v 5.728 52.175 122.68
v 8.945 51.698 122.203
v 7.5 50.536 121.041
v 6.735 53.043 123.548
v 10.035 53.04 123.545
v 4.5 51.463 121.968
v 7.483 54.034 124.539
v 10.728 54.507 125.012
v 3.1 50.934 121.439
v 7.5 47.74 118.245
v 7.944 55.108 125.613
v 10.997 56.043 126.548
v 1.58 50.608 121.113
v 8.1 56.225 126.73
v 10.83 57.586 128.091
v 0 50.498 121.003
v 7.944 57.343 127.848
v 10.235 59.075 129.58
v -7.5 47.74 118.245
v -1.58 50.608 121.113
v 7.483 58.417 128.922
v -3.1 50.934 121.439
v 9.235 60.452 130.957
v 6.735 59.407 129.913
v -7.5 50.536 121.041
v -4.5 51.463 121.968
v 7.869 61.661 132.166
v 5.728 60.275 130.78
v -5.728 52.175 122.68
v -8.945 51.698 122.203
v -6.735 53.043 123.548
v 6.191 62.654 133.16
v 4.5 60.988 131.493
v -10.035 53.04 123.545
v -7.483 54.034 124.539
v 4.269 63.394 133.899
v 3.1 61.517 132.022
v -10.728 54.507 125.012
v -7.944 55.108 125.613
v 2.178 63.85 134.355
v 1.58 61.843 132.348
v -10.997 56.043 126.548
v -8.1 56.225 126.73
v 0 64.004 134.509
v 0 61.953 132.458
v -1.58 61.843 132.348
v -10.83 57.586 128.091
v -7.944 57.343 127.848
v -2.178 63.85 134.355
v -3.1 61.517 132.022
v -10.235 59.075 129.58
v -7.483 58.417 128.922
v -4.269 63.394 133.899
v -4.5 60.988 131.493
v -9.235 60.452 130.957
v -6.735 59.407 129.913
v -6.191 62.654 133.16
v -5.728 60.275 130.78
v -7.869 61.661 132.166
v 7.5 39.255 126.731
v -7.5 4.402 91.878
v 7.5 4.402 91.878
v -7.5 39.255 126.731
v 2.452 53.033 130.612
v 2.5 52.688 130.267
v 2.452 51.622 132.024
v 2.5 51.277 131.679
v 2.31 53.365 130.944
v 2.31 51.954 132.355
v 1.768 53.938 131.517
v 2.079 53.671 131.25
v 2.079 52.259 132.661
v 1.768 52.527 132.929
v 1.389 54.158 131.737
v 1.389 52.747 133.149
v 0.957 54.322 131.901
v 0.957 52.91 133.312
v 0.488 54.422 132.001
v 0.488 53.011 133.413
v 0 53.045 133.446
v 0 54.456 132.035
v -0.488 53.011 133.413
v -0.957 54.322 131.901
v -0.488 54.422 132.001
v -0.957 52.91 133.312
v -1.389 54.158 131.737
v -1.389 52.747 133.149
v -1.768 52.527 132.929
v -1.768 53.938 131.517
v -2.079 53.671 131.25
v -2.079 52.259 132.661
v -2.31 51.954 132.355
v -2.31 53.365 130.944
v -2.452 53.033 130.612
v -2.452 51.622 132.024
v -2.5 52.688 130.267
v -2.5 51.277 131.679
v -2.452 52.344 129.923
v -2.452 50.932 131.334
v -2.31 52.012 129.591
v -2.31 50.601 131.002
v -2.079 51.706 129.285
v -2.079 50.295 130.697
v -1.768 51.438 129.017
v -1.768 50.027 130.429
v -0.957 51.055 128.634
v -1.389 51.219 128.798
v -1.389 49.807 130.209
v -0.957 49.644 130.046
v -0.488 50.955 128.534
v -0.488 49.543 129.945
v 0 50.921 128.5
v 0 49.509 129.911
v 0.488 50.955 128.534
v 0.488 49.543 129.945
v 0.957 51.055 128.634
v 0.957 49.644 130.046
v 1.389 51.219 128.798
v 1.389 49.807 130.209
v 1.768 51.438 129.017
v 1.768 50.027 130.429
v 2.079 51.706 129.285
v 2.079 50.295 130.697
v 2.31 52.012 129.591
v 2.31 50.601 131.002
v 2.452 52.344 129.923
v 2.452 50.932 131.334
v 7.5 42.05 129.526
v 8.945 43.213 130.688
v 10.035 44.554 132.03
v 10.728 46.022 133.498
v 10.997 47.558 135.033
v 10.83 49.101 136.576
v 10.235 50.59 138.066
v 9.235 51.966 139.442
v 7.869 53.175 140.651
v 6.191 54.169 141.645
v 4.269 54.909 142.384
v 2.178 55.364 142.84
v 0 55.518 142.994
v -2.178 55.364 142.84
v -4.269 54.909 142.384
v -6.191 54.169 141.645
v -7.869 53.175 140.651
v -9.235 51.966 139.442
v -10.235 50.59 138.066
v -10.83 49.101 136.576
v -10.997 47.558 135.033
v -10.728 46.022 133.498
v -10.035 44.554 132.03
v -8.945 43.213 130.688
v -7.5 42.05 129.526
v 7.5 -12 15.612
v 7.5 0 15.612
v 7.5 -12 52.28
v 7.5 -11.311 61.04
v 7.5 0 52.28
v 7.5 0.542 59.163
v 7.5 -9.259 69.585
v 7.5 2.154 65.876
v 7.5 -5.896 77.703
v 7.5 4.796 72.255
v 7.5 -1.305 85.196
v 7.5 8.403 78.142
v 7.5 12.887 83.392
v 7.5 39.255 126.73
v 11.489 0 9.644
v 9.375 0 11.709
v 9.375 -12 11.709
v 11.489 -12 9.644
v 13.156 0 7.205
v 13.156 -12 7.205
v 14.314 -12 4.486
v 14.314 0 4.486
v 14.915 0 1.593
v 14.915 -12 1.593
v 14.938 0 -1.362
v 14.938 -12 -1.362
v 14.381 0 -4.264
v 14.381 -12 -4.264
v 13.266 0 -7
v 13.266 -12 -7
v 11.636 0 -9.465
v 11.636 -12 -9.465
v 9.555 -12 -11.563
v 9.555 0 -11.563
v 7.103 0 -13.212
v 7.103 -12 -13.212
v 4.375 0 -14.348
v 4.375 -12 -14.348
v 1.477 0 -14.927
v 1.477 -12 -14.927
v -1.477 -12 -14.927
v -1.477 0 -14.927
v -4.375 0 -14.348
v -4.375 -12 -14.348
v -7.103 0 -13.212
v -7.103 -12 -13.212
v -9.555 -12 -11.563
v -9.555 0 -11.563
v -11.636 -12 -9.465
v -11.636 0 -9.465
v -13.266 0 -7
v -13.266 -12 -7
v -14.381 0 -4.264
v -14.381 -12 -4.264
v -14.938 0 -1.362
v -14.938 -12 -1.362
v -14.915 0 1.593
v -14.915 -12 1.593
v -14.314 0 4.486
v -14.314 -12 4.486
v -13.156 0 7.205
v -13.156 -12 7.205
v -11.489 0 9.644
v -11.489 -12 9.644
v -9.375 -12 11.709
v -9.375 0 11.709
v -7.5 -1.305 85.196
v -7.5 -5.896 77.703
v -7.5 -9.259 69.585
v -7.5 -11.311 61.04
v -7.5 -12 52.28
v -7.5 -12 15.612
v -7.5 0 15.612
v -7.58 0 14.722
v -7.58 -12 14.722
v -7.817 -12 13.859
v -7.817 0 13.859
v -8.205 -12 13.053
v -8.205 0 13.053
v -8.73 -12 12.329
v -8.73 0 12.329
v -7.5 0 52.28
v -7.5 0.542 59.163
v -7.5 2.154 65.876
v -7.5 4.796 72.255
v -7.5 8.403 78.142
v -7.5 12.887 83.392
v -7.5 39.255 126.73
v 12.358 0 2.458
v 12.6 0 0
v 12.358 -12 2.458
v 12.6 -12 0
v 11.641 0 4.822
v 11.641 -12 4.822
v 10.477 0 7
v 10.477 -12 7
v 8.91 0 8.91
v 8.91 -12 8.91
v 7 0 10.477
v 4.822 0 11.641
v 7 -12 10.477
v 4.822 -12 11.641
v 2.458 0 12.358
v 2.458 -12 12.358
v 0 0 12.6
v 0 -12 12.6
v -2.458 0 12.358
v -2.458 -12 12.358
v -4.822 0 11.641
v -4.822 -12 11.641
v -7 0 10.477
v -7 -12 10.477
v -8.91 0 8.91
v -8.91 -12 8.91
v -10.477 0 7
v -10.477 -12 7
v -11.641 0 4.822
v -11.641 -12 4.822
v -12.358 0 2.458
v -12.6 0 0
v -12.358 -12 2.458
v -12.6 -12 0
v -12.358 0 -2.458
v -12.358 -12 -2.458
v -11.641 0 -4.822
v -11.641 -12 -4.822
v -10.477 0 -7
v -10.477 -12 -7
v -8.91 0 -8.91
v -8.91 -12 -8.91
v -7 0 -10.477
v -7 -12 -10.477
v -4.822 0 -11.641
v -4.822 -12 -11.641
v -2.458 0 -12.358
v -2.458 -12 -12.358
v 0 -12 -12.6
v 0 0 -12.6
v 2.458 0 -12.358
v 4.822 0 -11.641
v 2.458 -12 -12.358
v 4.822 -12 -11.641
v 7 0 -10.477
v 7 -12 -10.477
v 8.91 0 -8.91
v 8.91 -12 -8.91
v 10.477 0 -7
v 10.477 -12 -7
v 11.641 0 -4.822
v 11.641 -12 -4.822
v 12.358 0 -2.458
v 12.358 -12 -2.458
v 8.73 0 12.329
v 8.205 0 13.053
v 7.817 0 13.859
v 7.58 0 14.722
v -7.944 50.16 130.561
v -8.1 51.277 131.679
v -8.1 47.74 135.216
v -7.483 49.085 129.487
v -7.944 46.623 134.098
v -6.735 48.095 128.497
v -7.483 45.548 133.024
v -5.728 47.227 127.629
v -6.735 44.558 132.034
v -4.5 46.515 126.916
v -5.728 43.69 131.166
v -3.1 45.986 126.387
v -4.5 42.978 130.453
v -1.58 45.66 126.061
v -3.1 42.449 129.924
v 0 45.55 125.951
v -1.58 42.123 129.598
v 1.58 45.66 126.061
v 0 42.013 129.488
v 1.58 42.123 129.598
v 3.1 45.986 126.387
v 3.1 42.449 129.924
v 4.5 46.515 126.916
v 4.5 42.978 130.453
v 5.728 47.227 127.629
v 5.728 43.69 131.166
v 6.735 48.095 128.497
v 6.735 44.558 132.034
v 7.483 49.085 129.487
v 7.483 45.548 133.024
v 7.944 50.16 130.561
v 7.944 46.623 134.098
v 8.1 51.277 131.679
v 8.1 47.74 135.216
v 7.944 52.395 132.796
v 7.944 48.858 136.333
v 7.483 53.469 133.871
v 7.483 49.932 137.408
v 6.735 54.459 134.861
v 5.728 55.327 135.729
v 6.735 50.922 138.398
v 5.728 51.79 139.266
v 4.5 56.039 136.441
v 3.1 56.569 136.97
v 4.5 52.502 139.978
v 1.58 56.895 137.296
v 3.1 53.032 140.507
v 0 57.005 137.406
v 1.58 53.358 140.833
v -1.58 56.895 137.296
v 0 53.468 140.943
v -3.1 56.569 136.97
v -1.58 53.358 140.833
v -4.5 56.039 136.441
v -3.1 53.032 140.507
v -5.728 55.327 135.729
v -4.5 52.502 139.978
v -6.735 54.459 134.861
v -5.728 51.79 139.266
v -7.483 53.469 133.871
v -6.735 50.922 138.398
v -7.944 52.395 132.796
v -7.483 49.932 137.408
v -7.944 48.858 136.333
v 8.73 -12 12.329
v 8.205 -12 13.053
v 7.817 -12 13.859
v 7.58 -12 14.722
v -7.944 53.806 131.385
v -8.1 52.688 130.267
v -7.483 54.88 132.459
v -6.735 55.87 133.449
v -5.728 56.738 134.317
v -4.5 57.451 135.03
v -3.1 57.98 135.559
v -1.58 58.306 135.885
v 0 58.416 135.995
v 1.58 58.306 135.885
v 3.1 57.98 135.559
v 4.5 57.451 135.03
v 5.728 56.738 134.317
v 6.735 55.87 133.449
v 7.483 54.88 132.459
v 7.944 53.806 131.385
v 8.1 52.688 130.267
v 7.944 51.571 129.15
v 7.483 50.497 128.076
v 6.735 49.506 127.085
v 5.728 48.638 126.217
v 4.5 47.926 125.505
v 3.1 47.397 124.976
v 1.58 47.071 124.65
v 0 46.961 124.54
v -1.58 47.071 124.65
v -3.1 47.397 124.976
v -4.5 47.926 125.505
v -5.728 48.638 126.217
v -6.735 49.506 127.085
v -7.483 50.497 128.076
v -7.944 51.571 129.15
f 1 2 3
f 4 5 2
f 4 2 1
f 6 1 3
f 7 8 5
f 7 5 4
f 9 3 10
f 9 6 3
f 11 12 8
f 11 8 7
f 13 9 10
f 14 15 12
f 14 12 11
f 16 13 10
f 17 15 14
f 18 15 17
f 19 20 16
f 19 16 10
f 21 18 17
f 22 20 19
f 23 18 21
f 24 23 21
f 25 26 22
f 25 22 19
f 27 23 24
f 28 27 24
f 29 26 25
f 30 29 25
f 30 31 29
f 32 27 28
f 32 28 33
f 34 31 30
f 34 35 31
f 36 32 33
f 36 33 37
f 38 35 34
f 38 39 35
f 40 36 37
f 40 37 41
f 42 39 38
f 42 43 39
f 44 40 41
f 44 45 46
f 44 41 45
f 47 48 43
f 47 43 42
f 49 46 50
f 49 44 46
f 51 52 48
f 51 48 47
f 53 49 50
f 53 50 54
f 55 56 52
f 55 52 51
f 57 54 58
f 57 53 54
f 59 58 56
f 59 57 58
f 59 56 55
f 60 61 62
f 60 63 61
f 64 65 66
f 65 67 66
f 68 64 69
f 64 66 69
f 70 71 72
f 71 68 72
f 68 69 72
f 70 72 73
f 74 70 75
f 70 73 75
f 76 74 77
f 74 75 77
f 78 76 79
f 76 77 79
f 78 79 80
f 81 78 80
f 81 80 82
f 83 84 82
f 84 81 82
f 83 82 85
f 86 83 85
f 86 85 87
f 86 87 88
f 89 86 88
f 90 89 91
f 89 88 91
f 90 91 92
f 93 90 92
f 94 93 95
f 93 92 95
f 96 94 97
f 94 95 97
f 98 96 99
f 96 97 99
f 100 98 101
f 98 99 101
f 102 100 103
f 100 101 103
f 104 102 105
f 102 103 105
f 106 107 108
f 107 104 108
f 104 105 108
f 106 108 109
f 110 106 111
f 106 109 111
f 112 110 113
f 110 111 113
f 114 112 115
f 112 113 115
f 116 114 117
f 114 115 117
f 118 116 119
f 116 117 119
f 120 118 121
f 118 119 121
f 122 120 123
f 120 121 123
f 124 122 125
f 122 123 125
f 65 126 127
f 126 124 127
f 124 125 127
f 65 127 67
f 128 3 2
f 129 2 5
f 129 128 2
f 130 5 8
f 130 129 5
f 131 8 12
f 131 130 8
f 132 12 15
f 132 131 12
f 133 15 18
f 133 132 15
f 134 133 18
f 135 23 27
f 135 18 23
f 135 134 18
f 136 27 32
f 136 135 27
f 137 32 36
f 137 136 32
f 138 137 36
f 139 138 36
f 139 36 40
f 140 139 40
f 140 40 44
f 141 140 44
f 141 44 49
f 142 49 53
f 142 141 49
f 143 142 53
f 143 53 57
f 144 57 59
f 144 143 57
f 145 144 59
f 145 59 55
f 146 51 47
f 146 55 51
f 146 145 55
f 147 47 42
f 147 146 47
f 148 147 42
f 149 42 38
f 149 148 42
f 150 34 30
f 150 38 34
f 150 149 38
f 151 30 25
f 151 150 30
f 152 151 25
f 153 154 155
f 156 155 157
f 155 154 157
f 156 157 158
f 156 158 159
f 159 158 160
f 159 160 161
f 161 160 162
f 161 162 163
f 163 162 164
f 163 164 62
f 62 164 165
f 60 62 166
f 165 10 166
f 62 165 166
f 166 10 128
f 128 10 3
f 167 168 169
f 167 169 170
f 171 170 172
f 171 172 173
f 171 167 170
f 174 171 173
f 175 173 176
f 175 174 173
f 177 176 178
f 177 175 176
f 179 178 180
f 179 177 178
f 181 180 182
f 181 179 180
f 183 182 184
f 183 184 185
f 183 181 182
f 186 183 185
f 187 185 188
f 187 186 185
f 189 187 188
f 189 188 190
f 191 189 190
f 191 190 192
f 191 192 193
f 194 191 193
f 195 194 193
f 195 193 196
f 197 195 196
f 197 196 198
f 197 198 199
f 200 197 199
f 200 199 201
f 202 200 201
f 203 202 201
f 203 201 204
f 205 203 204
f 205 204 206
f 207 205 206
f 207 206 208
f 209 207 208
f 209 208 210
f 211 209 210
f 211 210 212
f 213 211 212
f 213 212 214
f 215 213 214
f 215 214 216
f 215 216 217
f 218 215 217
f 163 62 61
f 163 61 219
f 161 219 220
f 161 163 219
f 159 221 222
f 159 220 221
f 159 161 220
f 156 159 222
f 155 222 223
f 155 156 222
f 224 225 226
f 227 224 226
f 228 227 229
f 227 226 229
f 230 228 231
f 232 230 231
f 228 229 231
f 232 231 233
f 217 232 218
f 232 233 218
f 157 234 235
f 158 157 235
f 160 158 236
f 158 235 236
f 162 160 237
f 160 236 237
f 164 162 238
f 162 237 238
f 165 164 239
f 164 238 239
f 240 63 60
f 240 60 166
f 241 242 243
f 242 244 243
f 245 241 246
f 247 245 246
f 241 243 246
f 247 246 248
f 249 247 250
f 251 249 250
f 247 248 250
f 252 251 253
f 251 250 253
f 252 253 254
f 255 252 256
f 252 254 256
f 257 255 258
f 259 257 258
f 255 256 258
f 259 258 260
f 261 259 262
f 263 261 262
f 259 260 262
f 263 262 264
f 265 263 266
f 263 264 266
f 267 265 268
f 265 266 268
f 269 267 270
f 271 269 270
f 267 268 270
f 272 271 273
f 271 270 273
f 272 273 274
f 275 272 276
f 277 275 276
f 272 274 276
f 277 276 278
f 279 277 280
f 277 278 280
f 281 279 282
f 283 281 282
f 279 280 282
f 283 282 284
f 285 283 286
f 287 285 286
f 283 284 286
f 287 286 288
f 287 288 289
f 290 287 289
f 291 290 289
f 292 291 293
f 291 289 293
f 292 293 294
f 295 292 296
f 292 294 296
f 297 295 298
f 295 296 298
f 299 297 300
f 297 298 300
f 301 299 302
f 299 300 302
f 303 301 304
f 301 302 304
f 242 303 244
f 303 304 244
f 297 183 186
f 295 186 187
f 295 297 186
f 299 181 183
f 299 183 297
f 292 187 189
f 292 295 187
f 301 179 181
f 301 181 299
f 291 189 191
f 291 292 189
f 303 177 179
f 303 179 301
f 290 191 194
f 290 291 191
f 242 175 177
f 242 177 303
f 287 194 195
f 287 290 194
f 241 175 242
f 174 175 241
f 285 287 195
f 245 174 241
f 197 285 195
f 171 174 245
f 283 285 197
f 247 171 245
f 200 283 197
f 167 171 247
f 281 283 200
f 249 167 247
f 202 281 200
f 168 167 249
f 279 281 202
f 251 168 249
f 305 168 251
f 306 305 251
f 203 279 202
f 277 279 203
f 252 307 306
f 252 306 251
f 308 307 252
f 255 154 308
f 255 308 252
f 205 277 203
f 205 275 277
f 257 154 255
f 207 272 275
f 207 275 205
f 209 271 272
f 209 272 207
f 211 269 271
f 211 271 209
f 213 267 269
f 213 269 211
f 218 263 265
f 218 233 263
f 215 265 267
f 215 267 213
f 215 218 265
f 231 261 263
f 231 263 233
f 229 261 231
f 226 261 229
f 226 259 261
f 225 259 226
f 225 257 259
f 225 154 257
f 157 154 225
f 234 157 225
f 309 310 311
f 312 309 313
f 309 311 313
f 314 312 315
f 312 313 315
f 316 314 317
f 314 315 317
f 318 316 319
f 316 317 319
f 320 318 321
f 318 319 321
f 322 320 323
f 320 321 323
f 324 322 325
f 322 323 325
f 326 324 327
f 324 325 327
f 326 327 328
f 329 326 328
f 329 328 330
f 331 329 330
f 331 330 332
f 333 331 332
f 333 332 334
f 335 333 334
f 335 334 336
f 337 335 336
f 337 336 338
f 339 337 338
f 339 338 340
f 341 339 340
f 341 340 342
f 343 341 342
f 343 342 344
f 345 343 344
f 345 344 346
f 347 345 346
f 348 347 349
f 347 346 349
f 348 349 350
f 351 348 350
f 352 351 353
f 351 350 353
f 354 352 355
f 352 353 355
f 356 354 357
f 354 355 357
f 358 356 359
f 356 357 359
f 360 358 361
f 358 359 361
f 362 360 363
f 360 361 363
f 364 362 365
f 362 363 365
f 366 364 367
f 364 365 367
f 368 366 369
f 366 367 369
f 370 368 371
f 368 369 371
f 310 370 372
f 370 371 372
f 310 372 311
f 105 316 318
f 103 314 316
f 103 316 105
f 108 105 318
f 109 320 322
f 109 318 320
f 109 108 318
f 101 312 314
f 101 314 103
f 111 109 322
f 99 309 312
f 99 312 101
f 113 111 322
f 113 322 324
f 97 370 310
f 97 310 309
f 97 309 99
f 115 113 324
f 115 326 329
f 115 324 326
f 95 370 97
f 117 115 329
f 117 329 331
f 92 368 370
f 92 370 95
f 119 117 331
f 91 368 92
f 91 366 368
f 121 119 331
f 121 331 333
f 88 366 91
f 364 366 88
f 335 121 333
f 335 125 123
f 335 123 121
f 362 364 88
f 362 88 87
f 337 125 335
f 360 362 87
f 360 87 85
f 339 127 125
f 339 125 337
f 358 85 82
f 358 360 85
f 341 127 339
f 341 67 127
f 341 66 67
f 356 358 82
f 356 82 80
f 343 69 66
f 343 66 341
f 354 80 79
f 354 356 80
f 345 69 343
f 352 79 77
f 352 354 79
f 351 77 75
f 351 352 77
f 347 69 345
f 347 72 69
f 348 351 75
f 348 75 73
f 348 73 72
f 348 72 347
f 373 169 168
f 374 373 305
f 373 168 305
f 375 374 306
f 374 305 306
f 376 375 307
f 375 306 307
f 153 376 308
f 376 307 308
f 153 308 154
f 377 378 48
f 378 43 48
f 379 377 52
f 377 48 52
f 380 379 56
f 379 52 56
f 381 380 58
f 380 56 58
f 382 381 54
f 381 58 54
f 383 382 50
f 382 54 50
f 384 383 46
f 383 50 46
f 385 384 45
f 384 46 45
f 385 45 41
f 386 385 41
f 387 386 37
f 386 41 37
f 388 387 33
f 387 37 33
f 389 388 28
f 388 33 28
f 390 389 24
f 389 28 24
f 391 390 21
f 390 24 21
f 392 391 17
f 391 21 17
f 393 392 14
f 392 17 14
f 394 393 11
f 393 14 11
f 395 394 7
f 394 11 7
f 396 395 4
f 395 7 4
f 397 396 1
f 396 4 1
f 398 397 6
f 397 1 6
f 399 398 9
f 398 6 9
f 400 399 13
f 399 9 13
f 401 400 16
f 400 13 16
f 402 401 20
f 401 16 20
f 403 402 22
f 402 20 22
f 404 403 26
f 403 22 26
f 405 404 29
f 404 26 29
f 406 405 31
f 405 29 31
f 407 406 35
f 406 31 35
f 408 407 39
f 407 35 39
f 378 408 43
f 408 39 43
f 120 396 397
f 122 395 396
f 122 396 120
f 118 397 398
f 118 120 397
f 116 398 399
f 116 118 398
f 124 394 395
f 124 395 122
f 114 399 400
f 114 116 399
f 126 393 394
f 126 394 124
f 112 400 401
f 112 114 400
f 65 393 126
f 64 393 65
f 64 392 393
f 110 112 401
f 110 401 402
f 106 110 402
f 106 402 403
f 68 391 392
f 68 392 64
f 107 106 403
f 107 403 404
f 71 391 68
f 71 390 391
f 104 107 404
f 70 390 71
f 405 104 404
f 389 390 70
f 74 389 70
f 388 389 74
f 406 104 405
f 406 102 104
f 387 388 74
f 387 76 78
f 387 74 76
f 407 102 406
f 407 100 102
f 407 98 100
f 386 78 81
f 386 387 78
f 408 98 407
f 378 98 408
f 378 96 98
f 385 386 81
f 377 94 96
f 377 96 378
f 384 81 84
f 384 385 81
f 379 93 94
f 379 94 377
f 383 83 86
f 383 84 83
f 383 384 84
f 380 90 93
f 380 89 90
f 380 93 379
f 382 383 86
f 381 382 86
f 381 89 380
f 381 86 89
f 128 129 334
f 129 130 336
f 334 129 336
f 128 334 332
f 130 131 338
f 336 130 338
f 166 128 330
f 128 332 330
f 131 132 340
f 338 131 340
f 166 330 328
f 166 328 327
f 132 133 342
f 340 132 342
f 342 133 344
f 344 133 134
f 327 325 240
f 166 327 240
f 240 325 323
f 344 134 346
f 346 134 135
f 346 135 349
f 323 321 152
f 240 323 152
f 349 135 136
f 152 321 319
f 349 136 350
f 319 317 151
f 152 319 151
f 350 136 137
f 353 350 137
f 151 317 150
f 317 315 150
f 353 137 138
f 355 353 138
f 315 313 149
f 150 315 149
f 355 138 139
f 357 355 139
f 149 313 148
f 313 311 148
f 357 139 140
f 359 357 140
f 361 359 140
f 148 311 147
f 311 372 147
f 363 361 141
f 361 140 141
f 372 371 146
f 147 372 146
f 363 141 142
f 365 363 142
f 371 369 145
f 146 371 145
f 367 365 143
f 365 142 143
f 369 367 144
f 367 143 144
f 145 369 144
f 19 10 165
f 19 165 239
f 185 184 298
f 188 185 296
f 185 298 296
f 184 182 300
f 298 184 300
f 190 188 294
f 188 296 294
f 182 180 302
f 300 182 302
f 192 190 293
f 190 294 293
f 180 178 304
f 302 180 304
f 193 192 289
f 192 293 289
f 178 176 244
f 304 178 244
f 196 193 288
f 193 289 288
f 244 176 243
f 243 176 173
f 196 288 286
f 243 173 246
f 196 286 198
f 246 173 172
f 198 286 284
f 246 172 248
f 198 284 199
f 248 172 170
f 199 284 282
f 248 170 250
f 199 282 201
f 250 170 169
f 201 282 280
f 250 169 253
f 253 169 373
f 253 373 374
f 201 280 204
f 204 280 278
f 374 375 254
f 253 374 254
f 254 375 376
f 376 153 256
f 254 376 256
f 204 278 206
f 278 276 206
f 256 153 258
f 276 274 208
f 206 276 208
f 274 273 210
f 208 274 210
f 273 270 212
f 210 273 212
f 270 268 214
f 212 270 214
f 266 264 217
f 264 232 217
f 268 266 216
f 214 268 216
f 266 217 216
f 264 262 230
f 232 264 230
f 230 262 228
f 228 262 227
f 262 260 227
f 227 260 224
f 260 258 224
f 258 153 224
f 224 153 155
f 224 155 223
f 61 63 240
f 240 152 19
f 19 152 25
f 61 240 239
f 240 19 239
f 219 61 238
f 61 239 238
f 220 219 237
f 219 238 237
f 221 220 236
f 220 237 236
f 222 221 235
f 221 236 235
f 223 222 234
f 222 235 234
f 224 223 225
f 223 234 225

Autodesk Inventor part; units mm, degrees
ref_plane "YZ Plane" through (0, 0, 0) normal (1, 0, 0) x (0, 1, 0)
sketch "Sketch1" plane through (0, 0, 0) normal (0, 1, 0) x (-1, 0, 0)
  arc A0 (-9.375, 11.7094) -> (9.375, 11.7094) centre (0, 0) ccw
  line L0 (-7.5, 15.6125) -> (-7.5, 22.9904)
  line L1 (7.5, 22.9904) -> (7.5, 15.6125)
  line L2 (7.5, 22.9904) -> (-7.5, 22.9904)
  arc A1 (7.5, 15.6125) -> (9.375, 11.7094) centre (12.5, 15.6125) ccw
  arc A2 (-9.375, 11.7094) -> (-7.5, 15.6125) centre (-12.5, 15.6125) ccw
  point P0 (7.5, 12.9904)
  point P1 (-7.5, 12.9904)
  point P2 (0, 12.9904)
  point P3 (0, 22.9904)
  dimension "d0" = 30
  dimension "d109" = 5
  dimension "d129" = 15
  dimension "d131" = 10
  dimension "d132" = 12.9904
extrude "Extrusion1" add sketch "Sketch1" against normal blind 12
sketch "Sketch22" plane through (-7.5, 0, 22.9904) normal (0, 0, 1) x (1, 0, 0)
  line L0 (0, 0) -> (0, -12) projected
  line L1 (15, -12) -> (0, -12) projected
  line L2 (0, 0) -> (15, 0)
  line L3 (15, 0) -> (15, -12)
  line L4 (15, -12) -> (0, -12)
  line L5 (0, -12) -> (0, 0)
  point P0 (7.5, 0)
sketch "Sketch23" plane through (0, 0, 0) normal (1, 0, 0) x (0, 1, 0)
  line L0 (0, 22.9904) -> (-12, 22.9904) projected
  line L1 (-6, 22.9904) -> (-6, 52.2797)
  line L2 (8.6447, 87.635) -> (43.4975, 122.4879)
  arc A0 (8.6447, 87.635) -> (-6, 52.2797) centre (44, 52.2797) ccw
  point P0 (0, 0)
  point P1 (-6, 72.9904)
  dimension "d110" = 50
  dimension "d111" = 70
  dimension "d112" = 135
  dimension "d113" = 50
sweep "Sweep2" add profiles "Sketch22" path "Sketch23" path curves L1 A0 L2
ref_plane "Work Plane11" through (7.5, 8.6447, 87.635) normal (0, 0.7071, -0.7071) x (-1, 0, 0)
sketch "Sketch24" plane through (7.5, 8.6447, 87.635) normal (0, 0.7071, -0.7071) x (-1, 0, 0)
  line L0 (0, 49.2893) -> (15, 49.2893) projected
  line L1 (0, 49.2893) -> (15, 49.2893)
  line L2 (0, 49.2893) -> (0, 53.2426)
  line L3 (15, 49.2893) -> (15, 53.2426)
  arc A0 (15, 53.2426) -> (0, 53.2426) centre (7.5, 61.2893) ccw
  point P0 (7.5, -68.08)
  point P1 (7.5, 49.2893)
  point P2 (7.5, 49.2893)
  dimension "d136" = 22
  dimension "d137" = 12
extrude "Extrusion17" add sketch "Sketch24" along normal mid plane 12
sketch "Sketch25" plane through (-7.5, 4.402, 91.8777) normal (0, -0.7071, 0.7071) x (1, 0, 0)
  circle A0 centre (7.5, 61.2893) radius 2.5
  arc A1 (15, 53.2426) -> (0, 53.2426) centre (7.5, 61.2893) ccw projected
  point P0 (7.5, -68.08)
  dimension "d123" = 5
extrude "Extrusion18" cut sketch "Sketch25" along normal through all both and the other way through all
sketch "Sketch26" plane through (0, -12, 0) normal (0, -1, 0) x (1, 0, 0)
  circle A0 centre (0, 0) radius 12.6
  dimension "d133" = 25.2
extrude "Extrusion19" cut sketch "Sketch26" against normal through all
sketch "Sketch28" plane through (7.5, 12.8873, 83.3924) normal (0, 0.7071, -0.7071) x (-1, 0, 0)
  circle A0 centre (7.5, 61.2893) radius 2.5 projected
  circle A1 centre (7.5, 61.2893) radius 8.1
  point P0 (7.5, -68.08)
  dimension "d141" = 16.2
extrude "Extrusion21" cut sketch "Sketch28" against normal blind 5
mirror "Mirror3" about plane through (7.5, 8.6447, 87.635) normal (0, 0.7071, -0.7071) of "Extrusion21"
ref_plane "Work Plane13" through (0, 0, 12.5) normal (0, 0, 1) x (1, 0, 0)
properties part number "proximal_link_1"
